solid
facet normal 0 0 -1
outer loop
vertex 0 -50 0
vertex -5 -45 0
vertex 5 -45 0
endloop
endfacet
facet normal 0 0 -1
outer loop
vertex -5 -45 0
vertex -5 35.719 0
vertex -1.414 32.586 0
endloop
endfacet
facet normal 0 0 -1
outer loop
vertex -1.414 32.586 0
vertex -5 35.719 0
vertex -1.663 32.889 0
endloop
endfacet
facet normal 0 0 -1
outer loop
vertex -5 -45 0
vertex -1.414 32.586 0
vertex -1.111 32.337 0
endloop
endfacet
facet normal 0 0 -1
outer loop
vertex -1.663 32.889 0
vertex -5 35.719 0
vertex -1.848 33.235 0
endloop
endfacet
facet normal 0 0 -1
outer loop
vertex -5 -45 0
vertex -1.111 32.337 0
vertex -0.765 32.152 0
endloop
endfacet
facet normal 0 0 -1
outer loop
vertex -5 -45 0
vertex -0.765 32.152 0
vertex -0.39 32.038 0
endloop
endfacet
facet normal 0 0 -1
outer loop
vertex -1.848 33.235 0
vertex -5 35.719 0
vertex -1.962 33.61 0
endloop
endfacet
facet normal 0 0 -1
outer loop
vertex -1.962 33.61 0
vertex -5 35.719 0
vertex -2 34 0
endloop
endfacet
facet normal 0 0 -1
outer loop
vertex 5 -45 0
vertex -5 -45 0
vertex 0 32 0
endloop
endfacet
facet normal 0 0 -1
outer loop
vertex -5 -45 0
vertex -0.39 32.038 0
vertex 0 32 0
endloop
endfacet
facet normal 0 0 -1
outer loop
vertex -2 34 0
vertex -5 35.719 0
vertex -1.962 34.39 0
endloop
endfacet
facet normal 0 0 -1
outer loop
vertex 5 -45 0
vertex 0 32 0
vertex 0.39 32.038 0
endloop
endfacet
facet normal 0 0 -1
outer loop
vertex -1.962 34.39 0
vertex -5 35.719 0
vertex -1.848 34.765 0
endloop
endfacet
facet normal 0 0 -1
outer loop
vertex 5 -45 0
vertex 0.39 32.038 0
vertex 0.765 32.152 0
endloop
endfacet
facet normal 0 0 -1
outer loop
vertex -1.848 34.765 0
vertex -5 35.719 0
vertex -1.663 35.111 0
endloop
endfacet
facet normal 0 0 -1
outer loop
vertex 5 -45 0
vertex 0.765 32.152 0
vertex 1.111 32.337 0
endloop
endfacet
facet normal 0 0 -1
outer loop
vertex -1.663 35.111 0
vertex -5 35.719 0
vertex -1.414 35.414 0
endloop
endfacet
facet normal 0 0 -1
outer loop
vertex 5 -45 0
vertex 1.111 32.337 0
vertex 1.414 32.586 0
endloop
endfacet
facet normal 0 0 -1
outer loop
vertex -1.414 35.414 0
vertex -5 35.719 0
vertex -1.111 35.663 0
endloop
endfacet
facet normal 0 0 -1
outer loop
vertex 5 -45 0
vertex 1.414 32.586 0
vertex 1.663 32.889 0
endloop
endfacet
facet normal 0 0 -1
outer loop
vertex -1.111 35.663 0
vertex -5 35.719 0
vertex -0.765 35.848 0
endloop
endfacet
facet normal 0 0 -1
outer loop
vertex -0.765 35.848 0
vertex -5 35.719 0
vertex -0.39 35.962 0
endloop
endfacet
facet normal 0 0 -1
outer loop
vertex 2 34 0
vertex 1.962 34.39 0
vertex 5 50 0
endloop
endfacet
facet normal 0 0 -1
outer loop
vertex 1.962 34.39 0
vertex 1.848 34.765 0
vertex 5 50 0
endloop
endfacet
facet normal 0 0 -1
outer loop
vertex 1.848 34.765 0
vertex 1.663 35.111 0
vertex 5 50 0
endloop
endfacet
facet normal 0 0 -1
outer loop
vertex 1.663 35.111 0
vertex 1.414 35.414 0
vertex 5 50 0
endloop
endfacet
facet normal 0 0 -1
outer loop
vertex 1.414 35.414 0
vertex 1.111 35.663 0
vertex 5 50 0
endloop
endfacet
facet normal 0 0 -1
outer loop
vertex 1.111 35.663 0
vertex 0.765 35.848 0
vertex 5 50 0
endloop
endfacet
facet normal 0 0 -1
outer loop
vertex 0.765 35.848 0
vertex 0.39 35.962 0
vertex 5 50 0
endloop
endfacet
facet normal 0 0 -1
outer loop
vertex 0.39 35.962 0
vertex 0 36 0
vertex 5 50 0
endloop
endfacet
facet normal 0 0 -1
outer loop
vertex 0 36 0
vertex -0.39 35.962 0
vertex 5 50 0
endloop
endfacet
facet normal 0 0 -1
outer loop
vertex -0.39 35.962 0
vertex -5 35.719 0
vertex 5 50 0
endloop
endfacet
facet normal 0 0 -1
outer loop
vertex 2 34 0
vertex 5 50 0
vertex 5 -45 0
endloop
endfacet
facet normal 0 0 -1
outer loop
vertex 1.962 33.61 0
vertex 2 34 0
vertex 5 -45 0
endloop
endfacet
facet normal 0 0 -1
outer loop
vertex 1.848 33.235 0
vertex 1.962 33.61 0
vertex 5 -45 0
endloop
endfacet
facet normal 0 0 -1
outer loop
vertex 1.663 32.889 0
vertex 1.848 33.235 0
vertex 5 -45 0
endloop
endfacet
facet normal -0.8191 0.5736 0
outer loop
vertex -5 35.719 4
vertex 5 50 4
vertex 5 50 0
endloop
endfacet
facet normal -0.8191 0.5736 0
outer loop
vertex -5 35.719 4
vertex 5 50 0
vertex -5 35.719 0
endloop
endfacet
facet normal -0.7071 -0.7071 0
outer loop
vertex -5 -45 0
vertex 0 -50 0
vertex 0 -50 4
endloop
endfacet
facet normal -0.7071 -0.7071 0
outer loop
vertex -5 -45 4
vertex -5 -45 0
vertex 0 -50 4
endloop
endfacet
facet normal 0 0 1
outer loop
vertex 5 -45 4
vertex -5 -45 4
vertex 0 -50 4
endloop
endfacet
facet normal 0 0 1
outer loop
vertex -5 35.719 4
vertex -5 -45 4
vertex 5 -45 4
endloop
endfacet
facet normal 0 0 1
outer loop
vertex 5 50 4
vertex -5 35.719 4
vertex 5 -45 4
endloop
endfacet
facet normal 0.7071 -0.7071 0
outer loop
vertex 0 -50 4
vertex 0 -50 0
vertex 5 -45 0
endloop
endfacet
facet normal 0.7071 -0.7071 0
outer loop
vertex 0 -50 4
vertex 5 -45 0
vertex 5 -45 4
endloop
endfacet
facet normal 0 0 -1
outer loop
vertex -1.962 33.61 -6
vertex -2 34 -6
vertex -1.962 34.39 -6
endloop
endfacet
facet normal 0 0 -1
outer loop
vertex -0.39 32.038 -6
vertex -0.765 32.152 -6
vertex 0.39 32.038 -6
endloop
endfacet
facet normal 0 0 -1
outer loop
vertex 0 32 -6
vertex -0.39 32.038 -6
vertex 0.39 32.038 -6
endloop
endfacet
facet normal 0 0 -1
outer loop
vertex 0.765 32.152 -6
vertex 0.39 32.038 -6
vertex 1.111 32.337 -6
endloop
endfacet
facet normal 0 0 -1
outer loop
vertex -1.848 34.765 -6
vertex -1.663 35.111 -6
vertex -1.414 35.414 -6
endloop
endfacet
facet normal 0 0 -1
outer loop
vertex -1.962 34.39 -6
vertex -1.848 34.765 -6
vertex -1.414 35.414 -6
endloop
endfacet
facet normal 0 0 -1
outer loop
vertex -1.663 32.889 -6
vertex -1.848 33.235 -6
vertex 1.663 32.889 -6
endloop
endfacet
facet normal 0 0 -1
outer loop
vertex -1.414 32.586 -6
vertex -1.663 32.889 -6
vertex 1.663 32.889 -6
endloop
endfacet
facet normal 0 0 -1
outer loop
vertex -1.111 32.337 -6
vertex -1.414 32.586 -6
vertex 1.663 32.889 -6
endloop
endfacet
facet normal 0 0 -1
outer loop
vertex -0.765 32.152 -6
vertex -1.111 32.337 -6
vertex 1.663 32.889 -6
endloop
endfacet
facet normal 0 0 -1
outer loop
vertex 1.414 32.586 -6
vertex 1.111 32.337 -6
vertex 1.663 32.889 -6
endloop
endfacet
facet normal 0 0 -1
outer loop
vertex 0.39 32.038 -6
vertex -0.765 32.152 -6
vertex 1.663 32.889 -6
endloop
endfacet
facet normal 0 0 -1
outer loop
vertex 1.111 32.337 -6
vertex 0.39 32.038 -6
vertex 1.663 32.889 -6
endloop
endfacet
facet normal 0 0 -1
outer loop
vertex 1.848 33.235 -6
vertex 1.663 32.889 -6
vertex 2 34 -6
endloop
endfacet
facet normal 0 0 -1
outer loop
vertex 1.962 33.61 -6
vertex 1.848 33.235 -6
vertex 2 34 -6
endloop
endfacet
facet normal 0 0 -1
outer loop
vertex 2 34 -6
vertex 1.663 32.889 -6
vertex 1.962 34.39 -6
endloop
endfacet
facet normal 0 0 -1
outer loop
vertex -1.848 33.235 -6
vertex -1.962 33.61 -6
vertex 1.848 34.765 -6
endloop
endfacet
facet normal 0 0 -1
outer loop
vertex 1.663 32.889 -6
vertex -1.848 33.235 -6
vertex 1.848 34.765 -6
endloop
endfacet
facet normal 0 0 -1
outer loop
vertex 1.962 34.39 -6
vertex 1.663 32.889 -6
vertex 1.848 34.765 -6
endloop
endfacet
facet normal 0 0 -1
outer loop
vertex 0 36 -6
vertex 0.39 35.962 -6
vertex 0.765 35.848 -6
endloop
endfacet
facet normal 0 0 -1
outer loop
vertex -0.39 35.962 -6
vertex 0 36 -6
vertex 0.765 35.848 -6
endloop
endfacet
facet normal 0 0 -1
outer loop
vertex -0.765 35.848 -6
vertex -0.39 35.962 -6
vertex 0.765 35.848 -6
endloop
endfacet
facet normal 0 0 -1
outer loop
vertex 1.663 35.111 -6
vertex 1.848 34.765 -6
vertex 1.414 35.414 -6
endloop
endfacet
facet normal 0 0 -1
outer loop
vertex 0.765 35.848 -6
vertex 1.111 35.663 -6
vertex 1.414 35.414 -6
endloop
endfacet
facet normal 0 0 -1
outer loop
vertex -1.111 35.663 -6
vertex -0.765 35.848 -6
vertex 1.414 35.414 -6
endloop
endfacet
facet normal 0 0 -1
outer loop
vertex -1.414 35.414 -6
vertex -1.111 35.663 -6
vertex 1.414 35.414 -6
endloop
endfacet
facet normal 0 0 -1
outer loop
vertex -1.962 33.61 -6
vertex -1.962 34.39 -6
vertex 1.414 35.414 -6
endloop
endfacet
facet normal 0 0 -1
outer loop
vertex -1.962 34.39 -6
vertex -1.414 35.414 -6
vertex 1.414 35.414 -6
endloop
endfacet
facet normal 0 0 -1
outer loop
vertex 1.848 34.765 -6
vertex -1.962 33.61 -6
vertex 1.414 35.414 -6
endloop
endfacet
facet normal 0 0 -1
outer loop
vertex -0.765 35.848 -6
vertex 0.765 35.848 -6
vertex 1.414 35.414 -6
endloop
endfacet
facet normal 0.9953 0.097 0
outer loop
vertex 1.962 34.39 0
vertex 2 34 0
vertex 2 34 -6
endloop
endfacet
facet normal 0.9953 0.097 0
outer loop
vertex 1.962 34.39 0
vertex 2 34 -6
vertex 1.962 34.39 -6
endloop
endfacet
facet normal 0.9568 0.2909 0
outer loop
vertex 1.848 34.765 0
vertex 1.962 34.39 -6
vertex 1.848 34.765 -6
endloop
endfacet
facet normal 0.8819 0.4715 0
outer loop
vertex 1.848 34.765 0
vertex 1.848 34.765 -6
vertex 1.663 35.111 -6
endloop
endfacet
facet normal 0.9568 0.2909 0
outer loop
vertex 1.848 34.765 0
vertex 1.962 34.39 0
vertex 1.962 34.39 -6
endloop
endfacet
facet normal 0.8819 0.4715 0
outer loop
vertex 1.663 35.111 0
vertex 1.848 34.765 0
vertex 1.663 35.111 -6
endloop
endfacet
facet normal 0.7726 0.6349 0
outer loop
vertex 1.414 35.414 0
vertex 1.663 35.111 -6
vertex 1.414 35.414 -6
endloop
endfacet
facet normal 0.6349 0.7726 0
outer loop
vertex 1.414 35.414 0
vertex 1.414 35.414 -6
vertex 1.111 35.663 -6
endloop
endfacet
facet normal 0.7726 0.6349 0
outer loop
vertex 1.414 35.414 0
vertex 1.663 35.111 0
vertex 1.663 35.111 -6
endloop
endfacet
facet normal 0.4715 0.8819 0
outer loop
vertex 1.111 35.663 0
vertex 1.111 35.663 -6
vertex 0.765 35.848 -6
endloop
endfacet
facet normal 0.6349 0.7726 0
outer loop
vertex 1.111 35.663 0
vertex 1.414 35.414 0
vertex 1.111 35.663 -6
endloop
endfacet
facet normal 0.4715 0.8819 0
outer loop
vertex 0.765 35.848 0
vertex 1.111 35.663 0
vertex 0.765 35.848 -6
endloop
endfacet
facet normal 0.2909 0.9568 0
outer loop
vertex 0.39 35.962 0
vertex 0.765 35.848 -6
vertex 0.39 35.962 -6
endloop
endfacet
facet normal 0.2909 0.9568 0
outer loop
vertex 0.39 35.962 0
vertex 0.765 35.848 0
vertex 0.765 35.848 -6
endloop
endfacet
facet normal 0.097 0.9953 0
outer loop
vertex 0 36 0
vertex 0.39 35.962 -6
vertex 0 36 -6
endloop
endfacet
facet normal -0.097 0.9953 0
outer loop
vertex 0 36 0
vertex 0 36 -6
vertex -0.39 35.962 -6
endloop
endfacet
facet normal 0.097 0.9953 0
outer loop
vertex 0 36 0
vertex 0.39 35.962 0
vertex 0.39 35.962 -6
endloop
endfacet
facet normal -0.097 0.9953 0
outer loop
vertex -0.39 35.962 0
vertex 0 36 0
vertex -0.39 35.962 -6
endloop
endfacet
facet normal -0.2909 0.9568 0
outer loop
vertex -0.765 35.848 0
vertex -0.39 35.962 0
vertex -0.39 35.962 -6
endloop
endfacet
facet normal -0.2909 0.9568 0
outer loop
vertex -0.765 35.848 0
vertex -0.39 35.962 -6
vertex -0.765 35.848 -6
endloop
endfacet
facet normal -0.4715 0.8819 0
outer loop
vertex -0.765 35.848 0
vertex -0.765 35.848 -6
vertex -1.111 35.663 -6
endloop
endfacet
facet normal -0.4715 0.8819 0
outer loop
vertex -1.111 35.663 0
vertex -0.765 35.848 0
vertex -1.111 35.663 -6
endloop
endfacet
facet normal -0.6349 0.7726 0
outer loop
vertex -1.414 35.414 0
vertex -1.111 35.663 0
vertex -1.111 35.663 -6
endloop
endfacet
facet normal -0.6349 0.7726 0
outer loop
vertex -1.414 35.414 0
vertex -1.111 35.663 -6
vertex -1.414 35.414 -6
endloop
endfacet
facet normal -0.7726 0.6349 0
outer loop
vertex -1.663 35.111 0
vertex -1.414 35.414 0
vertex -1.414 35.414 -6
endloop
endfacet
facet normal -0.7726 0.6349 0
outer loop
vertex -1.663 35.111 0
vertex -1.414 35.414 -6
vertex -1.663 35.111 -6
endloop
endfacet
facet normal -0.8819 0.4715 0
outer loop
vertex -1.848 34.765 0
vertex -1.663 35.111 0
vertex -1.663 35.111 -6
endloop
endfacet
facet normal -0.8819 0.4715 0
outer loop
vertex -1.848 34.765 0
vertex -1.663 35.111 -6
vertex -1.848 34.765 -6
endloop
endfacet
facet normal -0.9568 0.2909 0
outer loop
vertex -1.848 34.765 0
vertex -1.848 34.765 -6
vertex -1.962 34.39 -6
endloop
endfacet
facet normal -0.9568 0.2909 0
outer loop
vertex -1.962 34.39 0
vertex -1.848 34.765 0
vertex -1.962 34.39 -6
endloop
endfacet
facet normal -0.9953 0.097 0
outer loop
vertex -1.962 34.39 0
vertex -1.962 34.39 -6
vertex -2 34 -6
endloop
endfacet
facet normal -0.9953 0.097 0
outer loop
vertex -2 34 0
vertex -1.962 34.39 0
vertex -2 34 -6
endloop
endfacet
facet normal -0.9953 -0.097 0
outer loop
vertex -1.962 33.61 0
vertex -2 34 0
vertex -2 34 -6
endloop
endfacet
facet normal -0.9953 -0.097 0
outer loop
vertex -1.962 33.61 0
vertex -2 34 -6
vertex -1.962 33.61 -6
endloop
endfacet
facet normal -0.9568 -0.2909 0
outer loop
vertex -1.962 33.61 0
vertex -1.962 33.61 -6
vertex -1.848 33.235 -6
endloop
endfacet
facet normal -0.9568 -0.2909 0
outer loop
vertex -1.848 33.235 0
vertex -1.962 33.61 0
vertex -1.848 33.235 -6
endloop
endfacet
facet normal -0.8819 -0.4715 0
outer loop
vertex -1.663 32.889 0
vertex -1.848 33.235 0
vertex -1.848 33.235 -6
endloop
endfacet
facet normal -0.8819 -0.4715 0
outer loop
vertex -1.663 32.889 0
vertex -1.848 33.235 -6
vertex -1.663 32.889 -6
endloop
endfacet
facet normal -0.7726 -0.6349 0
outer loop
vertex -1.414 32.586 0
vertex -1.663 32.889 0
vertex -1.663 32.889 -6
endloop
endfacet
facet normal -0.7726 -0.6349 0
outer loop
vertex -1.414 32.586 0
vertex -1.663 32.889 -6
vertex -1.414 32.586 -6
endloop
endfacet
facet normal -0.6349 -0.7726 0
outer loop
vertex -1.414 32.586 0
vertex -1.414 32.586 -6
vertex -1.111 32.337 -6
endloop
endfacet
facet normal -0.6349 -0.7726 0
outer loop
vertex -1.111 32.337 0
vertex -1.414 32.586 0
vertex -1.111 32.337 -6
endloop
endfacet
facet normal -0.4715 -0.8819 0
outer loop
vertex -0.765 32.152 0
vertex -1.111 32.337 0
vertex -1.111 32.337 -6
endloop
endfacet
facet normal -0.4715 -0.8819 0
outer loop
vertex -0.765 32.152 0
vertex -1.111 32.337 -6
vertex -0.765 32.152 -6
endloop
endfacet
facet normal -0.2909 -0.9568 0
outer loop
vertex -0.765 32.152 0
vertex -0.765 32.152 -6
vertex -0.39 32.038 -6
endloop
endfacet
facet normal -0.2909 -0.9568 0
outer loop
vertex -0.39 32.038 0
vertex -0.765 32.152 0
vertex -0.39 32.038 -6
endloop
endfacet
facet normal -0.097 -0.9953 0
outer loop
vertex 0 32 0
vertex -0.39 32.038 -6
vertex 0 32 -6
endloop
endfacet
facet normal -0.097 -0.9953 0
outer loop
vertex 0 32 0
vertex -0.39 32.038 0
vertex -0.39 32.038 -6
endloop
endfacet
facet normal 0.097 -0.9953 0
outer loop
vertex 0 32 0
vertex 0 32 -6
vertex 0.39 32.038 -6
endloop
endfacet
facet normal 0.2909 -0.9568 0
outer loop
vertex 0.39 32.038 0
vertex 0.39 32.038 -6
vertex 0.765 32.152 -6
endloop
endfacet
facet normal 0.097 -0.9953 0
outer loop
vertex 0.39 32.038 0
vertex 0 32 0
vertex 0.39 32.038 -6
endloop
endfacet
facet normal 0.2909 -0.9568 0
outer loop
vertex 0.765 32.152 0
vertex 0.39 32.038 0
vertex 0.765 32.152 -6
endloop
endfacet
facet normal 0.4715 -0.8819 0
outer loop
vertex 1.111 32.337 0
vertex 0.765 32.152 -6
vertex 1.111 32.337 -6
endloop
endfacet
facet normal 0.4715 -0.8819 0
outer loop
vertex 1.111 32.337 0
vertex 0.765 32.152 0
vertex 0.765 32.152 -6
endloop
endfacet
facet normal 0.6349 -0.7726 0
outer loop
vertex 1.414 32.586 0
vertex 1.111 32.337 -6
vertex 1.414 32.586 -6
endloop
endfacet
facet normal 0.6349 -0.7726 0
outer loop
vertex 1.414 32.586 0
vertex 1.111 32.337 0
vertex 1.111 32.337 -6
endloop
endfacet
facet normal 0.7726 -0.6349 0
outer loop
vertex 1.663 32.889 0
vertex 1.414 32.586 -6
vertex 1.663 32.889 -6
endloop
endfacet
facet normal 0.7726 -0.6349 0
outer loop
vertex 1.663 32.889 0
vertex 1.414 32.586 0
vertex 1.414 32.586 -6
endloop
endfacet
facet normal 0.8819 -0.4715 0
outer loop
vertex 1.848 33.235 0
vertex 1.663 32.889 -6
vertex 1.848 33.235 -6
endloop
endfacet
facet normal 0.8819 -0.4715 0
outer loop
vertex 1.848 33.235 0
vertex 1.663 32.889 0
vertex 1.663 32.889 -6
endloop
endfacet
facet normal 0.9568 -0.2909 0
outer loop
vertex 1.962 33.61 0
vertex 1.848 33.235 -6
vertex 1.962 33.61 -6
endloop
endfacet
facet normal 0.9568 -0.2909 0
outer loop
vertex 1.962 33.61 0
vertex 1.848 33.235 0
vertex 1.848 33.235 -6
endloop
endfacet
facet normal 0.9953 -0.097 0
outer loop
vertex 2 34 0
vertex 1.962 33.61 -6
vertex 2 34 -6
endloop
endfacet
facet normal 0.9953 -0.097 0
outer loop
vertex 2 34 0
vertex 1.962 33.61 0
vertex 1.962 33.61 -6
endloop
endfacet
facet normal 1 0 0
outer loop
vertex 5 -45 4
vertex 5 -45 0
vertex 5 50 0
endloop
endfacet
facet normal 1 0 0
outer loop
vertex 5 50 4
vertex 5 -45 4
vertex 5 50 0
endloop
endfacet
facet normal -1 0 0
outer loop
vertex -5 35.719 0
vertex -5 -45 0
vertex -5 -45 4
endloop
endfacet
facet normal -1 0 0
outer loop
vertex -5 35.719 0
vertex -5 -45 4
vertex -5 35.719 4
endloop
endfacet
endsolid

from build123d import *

# Parameters (mm, degrees)
SKETCH1_W           = 10
SKETCH1_H           = 100
BOSS_EXTRUDE1_DEPTH = 4
CUT_EXTRUDE1_DEPTH  = 4
CHAMFER1_SIZE       = 5
SKETCH3_R           = 2
BOSS_EXTRUDE2_DEPTH = 10


with BuildPart() as part:
    # Sketch1 → Boss-Extrude1 (new body)
    with BuildSketch(Plane.XY):
        Rectangle(SKETCH1_W, SKETCH1_H)
    extrude(amount=BOSS_EXTRUDE1_DEPTH)

    # Sketch2 → Cut-Extrude1 (cut)
    with BuildSketch(Plane.XY.offset(4)):
        Polygon((5, 50), (-5, 35.718519933), (-5, 50), align=None)
    extrude(amount=-CUT_EXTRUDE1_DEPTH, mode=Mode.SUBTRACT)

    # Chamfer1
    chamfer1_edges = [part.edges().sort_by_distance(p)[0] for p in [
        (-5, -50, 2),
        (5, -50, 2),
    ]]
    chamfer(chamfer1_edges, length=CHAMFER1_SIZE - 0.0001)  # a hair under: the kernel refuses the full size

    # Sketch3 → Boss-Extrude2 (add)
    with BuildSketch(Plane.XY.offset(4)):
        with Locations((0, 34)):
            Circle(SKETCH3_R)
    extrude(amount=-BOSS_EXTRUDE2_DEPTH)


solid = part.part
